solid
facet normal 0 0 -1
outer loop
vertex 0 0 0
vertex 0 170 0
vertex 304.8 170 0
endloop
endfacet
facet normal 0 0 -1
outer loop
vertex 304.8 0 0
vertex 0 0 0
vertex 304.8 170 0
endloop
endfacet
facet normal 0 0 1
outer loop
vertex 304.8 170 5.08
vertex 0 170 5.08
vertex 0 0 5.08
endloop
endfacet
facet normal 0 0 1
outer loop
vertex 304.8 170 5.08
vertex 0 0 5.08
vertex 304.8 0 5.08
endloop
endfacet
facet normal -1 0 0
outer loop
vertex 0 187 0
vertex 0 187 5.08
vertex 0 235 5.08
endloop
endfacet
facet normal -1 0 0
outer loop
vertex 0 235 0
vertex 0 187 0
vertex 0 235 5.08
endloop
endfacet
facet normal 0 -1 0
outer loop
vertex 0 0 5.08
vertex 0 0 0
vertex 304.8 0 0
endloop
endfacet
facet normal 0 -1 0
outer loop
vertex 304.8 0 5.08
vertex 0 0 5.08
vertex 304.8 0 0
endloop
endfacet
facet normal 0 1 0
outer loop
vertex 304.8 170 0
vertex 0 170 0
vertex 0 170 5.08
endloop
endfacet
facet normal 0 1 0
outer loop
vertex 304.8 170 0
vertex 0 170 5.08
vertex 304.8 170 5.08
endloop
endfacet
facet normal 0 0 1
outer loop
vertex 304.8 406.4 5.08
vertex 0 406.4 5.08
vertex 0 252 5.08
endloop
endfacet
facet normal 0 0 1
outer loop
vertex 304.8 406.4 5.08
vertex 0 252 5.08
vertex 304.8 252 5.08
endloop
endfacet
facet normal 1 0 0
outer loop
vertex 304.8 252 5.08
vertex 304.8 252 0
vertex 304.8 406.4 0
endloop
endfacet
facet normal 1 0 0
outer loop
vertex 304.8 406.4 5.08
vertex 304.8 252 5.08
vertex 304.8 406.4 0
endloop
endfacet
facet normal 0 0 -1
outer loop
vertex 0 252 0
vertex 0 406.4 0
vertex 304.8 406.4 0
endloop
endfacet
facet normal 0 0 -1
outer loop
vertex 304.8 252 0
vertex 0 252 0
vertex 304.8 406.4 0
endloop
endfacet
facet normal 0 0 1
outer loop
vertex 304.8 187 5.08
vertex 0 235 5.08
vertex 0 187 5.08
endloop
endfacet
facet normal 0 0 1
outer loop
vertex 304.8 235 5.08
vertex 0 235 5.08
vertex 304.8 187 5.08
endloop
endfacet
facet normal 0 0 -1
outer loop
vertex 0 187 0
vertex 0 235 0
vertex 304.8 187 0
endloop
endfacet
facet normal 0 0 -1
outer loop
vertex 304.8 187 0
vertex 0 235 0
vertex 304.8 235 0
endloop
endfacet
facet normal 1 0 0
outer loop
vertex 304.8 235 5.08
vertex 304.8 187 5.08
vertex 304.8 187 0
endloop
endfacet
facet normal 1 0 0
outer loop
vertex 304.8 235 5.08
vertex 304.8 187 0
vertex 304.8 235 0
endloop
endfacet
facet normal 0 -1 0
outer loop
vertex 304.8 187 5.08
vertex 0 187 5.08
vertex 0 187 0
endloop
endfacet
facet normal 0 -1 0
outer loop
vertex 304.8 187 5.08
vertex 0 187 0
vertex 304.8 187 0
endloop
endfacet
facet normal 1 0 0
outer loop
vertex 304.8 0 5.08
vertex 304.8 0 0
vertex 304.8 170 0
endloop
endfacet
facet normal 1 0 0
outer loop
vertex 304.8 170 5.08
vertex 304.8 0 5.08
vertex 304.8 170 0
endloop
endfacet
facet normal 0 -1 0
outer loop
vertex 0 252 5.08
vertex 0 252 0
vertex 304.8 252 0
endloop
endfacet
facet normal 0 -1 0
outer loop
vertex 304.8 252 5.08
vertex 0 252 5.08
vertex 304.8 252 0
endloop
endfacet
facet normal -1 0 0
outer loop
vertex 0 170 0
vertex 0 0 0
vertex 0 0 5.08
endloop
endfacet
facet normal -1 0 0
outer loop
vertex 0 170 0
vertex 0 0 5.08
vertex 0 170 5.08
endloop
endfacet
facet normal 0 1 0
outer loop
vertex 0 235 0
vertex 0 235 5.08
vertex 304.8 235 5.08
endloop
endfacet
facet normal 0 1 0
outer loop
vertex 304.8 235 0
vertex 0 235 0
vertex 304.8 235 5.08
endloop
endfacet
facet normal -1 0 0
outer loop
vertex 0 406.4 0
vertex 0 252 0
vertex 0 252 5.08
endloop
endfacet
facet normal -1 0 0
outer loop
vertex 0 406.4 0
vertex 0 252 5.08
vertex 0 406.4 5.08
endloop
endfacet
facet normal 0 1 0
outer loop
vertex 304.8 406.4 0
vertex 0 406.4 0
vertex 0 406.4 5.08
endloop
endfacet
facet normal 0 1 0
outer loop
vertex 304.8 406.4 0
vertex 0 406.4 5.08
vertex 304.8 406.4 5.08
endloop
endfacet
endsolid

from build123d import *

# Parameters (mm, degrees)
SKETCH1_W             = 304.8
SKETCH1_H             = 154.4
BOSS_EXTRUDE1_DEPTH   = 5.08
SKETCH1_H_2           = 170
BOSS_EXTRUDE1_2_DEPTH = 5.08
SKETCH2_W             = 304.8
SKETCH2_H             = 48
BOSS_EXTRUDE2_DEPTH   = 5.08


with BuildPart() as part:
    # Sketch1 → Boss-Extrude1 (new body)
    with BuildSketch(Plane.XY):
        with Locations((152.4, 329.2)):
            Rectangle(SKETCH1_W, SKETCH1_H)
    extrude(amount=BOSS_EXTRUDE1_DEPTH)


with BuildPart() as body_2:
    # Sketch1 → Boss-Extrude1 2 (new body)
    with BuildSketch(Plane.XY):
        with Locations((152.4, 85)):
            Rectangle(SKETCH1_W, SKETCH1_H_2)
    extrude(amount=BOSS_EXTRUDE1_2_DEPTH)


with BuildPart() as body_3:
    # Sketch2 → Boss-Extrude2 (new body)
    with BuildSketch(Plane.XY.offset(5.08)):
        with Locations((152.4, 211)):
            Rectangle(SKETCH2_W, SKETCH2_H)
    extrude(amount=-BOSS_EXTRUDE2_DEPTH)


solid = Compound([part.part, body_2.part, body_3.part])
